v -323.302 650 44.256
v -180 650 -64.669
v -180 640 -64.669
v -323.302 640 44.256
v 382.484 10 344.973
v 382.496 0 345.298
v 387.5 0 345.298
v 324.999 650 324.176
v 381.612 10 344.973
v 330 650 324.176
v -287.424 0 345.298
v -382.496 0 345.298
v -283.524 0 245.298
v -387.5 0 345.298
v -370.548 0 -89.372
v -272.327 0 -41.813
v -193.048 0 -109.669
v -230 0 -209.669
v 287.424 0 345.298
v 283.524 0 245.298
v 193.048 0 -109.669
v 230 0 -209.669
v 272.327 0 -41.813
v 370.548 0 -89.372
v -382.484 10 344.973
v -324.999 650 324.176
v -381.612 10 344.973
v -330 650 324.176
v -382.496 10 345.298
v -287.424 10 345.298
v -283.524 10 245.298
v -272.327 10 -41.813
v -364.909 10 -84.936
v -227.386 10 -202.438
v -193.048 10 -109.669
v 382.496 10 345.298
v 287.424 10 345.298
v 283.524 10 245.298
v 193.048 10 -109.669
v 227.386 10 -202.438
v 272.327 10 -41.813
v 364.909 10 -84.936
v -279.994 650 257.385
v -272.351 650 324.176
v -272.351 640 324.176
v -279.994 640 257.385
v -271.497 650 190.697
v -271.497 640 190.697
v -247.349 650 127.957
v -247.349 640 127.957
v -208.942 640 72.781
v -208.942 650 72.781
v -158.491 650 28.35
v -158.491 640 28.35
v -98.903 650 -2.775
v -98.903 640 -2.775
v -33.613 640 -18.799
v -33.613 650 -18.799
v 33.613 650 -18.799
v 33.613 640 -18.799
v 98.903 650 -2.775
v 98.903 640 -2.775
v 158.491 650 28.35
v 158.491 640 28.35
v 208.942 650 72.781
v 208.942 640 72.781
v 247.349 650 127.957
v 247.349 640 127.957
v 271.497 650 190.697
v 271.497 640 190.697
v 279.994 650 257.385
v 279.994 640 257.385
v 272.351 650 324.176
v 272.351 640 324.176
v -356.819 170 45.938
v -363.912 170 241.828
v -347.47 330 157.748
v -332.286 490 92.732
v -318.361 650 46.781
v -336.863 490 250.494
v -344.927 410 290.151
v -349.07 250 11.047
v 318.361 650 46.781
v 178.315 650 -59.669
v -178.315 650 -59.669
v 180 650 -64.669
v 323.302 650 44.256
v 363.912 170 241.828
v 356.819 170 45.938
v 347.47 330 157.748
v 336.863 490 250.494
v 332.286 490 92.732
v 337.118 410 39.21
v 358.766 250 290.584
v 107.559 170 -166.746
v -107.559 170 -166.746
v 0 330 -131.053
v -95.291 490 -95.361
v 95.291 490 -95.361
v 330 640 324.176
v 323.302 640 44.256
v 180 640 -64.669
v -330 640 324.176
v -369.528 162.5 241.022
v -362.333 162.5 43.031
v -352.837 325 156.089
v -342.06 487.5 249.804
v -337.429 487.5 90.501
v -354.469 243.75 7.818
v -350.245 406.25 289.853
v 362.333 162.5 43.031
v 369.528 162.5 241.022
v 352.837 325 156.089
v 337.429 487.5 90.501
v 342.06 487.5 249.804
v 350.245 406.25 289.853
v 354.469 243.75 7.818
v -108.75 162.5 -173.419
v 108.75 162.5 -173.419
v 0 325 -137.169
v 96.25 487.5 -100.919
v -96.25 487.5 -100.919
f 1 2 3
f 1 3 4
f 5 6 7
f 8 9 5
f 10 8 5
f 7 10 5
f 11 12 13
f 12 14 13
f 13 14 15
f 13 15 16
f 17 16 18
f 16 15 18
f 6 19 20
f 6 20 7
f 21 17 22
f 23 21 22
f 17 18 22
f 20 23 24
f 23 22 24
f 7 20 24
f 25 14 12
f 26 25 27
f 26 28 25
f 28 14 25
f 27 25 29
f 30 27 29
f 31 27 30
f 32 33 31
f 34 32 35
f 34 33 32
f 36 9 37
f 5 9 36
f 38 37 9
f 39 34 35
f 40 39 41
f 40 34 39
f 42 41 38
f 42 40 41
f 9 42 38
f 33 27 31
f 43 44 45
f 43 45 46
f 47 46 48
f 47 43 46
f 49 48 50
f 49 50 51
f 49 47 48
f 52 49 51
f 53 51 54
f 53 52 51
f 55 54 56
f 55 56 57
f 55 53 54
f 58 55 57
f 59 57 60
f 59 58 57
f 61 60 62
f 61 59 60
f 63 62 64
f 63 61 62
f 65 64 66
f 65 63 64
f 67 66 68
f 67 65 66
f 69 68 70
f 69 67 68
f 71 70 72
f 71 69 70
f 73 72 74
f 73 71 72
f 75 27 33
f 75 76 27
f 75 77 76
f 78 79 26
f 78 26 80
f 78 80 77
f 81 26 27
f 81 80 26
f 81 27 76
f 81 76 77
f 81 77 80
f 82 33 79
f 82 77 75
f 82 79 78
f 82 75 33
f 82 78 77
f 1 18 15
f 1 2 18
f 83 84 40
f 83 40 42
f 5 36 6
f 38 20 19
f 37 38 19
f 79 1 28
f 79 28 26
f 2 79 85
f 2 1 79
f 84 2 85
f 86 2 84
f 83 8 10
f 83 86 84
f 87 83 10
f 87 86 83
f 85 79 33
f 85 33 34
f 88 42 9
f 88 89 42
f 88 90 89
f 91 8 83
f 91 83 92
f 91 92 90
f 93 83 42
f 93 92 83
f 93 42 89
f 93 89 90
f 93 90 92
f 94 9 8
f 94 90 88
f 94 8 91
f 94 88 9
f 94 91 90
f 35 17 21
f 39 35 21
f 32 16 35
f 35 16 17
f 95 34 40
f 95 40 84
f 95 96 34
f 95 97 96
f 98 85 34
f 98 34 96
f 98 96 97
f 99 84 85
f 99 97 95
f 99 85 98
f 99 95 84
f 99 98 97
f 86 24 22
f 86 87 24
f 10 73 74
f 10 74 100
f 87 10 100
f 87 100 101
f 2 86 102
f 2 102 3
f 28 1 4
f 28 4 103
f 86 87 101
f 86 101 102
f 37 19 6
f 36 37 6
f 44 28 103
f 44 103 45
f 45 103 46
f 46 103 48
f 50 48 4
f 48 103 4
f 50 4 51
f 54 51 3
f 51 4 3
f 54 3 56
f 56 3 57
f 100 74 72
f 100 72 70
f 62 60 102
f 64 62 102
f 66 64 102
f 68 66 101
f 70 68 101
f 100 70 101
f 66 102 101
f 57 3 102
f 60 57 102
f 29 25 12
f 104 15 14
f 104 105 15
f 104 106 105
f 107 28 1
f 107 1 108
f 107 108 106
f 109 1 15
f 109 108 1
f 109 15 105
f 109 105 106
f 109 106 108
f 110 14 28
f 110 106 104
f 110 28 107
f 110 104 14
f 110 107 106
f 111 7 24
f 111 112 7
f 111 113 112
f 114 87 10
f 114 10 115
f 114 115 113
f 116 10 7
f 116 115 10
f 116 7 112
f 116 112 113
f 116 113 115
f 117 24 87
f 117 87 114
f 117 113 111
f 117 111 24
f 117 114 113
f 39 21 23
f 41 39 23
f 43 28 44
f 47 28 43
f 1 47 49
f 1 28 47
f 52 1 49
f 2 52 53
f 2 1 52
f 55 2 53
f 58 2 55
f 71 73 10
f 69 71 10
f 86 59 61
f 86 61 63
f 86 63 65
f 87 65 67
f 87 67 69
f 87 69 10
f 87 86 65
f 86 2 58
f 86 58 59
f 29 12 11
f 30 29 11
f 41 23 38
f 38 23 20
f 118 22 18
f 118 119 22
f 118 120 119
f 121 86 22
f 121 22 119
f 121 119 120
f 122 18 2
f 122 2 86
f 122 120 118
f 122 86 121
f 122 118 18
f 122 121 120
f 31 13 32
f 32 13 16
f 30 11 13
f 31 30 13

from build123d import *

# Parameters (mm, degrees)
BOSS_EXTRUDE1_DEPTH = 10
BOSS_EXTRUDE2_DEPTH = 10


with BuildPart() as part:
    # Sketch1 → Loft1 section 0
    with BuildSketch(Plane(origin=(0, 0, 0), x_dir=(1, 0, 0), z_dir=(0, 1, 0))):
        with BuildLine():
            Line((-370.547784, 89.371854891), (-387.5, -345.297700488))
            Line((-387.5, -345.297700488), (-382.496198898, -345.297700488))
            Line((-382.496198898, -345.297700488), (-365.636723379, 86.993908355))
            Line((-365.636723379, 86.993908355), (-228.152394099, 204.668656231))
            Line((-228.152394099, 204.668656231), (228.152394099, 204.668656231))
            Line((228.152394099, 204.668656231), (365.636723379, 86.993908355))
            Line((365.636723379, 86.993908355), (382.496198898, -345.297700488))
            Line((382.496198898, -345.297700488), (387.5, -345.297700488))
            Line((387.5, -345.297700488), (370.547784, 89.371854891))
            Line((370.547784, 89.371854891), (230, 209.668656231))
            Line((230, 209.668656231), (-230, 209.668656231))
            Line((-230, 209.668656231), (-370.547784, 89.371854891))
        make_face()
    # Sketch2 → Loft1 section 1
    with BuildSketch(Plane(origin=(0, 650, 0), x_dir=(1, 0, 0), z_dir=(0, 1, 0))):
        with BuildLine():
            Line((-323.301913526, -44.255912071), (-330, -324.175785674))
            Line((-330, -324.175785674), (-324.998568762, -324.175785674))
            Line((-324.998568762, -324.175785674), (-318.360896032, -46.780664139))
            Line((-318.360896032, -46.780664139), (-178.315435762, 59.668656231))
            Line((-178.315435762, 59.668656231), (178.315435762, 59.668656231))
            Line((178.315435762, 59.668656231), (318.360896032, -46.780664139))
            Line((318.360896032, -46.780664139), (324.998568762, -324.175785674))
            Line((324.998568762, -324.175785674), (330, -324.175785674))
            Line((330, -324.175785674), (323.301913526, -44.255912071))
            Line((323.301913526, -44.255912071), (180, 64.668656231))
            Line((180, 64.668656231), (-180, 64.668656231))
            Line((-180, 64.668656231), (-323.301913526, -44.255912071))
        make_face()
    loft()

    # Sketch1<51> → Boss-Extrude1 (add)
    with BuildSketch(Plane(origin=(0, 0, 0), x_dir=(1, 0, 0), z_dir=(0, 1, 0))):
        Polygon((-365.636723379, 86.993908355), (-382.496198898, -345.297700488), (-287.42397797, -345.297700488), (-283.523954195, -245.297700488), (-272.326571574, 41.812924175), (-193.047881985, 109.668656231), (193.047881985, 109.668656231), (272.326571574, 41.812924175), (283.523954195, -245.297700488), (287.42397797, -345.297700488), (382.496198898, -345.297700488), (365.636723379, 86.993908355), (228.152394099, 204.668656231), (-228.152394099, 204.668656231), align=None)
    extrude(amount=BOSS_EXTRUDE1_DEPTH)


with BuildPart() as body_2:
    # Sketch2<31> → Boss-Extrude2 (new body)
    with BuildSketch(Plane(origin=(0, 650, 0), x_dir=(1, 0, 0), z_dir=(0, 1, 0))):
        with BuildLine():
            Line((-318.360896032, -46.780664139), (-324.998568762, -324.175785674))
            Line((-324.998568762, -324.175785674), (-272.350876628, -324.175785674))
            ThreePointArc((-272.350876628, -324.175785674), (0, 20.824214326), (272.350876628, -324.175785674))
            Line((272.350876628, -324.175785674), (324.998568762, -324.175785674))
            Line((324.998568762, -324.175785674), (318.360896032, -46.780664139))
            Line((318.360896032, -46.780664139), (178.315435762, 59.668656231))
            Line((178.315435762, 59.668656231), (-178.315435762, 59.668656231))
            Line((-178.315435762, 59.668656231), (-318.360896032, -46.780664139))
        make_face()
        Polygon((-323.301913526, -44.255912071), (-330, -324.175785674), (-324.998568762, -324.175785674), (-318.360896032, -46.780664139), (-178.315435762, 59.668656231), (178.315435762, 59.668656231), (318.360896032, -46.780664139), (324.998568762, -324.175785674), (330, -324.175785674), (323.301913526, -44.255912071), (180, 64.668656231), (-180, 64.668656231), align=None)
    extrude(amount=-BOSS_EXTRUDE2_DEPTH)


solid = Compound([part.part, body_2.part])
